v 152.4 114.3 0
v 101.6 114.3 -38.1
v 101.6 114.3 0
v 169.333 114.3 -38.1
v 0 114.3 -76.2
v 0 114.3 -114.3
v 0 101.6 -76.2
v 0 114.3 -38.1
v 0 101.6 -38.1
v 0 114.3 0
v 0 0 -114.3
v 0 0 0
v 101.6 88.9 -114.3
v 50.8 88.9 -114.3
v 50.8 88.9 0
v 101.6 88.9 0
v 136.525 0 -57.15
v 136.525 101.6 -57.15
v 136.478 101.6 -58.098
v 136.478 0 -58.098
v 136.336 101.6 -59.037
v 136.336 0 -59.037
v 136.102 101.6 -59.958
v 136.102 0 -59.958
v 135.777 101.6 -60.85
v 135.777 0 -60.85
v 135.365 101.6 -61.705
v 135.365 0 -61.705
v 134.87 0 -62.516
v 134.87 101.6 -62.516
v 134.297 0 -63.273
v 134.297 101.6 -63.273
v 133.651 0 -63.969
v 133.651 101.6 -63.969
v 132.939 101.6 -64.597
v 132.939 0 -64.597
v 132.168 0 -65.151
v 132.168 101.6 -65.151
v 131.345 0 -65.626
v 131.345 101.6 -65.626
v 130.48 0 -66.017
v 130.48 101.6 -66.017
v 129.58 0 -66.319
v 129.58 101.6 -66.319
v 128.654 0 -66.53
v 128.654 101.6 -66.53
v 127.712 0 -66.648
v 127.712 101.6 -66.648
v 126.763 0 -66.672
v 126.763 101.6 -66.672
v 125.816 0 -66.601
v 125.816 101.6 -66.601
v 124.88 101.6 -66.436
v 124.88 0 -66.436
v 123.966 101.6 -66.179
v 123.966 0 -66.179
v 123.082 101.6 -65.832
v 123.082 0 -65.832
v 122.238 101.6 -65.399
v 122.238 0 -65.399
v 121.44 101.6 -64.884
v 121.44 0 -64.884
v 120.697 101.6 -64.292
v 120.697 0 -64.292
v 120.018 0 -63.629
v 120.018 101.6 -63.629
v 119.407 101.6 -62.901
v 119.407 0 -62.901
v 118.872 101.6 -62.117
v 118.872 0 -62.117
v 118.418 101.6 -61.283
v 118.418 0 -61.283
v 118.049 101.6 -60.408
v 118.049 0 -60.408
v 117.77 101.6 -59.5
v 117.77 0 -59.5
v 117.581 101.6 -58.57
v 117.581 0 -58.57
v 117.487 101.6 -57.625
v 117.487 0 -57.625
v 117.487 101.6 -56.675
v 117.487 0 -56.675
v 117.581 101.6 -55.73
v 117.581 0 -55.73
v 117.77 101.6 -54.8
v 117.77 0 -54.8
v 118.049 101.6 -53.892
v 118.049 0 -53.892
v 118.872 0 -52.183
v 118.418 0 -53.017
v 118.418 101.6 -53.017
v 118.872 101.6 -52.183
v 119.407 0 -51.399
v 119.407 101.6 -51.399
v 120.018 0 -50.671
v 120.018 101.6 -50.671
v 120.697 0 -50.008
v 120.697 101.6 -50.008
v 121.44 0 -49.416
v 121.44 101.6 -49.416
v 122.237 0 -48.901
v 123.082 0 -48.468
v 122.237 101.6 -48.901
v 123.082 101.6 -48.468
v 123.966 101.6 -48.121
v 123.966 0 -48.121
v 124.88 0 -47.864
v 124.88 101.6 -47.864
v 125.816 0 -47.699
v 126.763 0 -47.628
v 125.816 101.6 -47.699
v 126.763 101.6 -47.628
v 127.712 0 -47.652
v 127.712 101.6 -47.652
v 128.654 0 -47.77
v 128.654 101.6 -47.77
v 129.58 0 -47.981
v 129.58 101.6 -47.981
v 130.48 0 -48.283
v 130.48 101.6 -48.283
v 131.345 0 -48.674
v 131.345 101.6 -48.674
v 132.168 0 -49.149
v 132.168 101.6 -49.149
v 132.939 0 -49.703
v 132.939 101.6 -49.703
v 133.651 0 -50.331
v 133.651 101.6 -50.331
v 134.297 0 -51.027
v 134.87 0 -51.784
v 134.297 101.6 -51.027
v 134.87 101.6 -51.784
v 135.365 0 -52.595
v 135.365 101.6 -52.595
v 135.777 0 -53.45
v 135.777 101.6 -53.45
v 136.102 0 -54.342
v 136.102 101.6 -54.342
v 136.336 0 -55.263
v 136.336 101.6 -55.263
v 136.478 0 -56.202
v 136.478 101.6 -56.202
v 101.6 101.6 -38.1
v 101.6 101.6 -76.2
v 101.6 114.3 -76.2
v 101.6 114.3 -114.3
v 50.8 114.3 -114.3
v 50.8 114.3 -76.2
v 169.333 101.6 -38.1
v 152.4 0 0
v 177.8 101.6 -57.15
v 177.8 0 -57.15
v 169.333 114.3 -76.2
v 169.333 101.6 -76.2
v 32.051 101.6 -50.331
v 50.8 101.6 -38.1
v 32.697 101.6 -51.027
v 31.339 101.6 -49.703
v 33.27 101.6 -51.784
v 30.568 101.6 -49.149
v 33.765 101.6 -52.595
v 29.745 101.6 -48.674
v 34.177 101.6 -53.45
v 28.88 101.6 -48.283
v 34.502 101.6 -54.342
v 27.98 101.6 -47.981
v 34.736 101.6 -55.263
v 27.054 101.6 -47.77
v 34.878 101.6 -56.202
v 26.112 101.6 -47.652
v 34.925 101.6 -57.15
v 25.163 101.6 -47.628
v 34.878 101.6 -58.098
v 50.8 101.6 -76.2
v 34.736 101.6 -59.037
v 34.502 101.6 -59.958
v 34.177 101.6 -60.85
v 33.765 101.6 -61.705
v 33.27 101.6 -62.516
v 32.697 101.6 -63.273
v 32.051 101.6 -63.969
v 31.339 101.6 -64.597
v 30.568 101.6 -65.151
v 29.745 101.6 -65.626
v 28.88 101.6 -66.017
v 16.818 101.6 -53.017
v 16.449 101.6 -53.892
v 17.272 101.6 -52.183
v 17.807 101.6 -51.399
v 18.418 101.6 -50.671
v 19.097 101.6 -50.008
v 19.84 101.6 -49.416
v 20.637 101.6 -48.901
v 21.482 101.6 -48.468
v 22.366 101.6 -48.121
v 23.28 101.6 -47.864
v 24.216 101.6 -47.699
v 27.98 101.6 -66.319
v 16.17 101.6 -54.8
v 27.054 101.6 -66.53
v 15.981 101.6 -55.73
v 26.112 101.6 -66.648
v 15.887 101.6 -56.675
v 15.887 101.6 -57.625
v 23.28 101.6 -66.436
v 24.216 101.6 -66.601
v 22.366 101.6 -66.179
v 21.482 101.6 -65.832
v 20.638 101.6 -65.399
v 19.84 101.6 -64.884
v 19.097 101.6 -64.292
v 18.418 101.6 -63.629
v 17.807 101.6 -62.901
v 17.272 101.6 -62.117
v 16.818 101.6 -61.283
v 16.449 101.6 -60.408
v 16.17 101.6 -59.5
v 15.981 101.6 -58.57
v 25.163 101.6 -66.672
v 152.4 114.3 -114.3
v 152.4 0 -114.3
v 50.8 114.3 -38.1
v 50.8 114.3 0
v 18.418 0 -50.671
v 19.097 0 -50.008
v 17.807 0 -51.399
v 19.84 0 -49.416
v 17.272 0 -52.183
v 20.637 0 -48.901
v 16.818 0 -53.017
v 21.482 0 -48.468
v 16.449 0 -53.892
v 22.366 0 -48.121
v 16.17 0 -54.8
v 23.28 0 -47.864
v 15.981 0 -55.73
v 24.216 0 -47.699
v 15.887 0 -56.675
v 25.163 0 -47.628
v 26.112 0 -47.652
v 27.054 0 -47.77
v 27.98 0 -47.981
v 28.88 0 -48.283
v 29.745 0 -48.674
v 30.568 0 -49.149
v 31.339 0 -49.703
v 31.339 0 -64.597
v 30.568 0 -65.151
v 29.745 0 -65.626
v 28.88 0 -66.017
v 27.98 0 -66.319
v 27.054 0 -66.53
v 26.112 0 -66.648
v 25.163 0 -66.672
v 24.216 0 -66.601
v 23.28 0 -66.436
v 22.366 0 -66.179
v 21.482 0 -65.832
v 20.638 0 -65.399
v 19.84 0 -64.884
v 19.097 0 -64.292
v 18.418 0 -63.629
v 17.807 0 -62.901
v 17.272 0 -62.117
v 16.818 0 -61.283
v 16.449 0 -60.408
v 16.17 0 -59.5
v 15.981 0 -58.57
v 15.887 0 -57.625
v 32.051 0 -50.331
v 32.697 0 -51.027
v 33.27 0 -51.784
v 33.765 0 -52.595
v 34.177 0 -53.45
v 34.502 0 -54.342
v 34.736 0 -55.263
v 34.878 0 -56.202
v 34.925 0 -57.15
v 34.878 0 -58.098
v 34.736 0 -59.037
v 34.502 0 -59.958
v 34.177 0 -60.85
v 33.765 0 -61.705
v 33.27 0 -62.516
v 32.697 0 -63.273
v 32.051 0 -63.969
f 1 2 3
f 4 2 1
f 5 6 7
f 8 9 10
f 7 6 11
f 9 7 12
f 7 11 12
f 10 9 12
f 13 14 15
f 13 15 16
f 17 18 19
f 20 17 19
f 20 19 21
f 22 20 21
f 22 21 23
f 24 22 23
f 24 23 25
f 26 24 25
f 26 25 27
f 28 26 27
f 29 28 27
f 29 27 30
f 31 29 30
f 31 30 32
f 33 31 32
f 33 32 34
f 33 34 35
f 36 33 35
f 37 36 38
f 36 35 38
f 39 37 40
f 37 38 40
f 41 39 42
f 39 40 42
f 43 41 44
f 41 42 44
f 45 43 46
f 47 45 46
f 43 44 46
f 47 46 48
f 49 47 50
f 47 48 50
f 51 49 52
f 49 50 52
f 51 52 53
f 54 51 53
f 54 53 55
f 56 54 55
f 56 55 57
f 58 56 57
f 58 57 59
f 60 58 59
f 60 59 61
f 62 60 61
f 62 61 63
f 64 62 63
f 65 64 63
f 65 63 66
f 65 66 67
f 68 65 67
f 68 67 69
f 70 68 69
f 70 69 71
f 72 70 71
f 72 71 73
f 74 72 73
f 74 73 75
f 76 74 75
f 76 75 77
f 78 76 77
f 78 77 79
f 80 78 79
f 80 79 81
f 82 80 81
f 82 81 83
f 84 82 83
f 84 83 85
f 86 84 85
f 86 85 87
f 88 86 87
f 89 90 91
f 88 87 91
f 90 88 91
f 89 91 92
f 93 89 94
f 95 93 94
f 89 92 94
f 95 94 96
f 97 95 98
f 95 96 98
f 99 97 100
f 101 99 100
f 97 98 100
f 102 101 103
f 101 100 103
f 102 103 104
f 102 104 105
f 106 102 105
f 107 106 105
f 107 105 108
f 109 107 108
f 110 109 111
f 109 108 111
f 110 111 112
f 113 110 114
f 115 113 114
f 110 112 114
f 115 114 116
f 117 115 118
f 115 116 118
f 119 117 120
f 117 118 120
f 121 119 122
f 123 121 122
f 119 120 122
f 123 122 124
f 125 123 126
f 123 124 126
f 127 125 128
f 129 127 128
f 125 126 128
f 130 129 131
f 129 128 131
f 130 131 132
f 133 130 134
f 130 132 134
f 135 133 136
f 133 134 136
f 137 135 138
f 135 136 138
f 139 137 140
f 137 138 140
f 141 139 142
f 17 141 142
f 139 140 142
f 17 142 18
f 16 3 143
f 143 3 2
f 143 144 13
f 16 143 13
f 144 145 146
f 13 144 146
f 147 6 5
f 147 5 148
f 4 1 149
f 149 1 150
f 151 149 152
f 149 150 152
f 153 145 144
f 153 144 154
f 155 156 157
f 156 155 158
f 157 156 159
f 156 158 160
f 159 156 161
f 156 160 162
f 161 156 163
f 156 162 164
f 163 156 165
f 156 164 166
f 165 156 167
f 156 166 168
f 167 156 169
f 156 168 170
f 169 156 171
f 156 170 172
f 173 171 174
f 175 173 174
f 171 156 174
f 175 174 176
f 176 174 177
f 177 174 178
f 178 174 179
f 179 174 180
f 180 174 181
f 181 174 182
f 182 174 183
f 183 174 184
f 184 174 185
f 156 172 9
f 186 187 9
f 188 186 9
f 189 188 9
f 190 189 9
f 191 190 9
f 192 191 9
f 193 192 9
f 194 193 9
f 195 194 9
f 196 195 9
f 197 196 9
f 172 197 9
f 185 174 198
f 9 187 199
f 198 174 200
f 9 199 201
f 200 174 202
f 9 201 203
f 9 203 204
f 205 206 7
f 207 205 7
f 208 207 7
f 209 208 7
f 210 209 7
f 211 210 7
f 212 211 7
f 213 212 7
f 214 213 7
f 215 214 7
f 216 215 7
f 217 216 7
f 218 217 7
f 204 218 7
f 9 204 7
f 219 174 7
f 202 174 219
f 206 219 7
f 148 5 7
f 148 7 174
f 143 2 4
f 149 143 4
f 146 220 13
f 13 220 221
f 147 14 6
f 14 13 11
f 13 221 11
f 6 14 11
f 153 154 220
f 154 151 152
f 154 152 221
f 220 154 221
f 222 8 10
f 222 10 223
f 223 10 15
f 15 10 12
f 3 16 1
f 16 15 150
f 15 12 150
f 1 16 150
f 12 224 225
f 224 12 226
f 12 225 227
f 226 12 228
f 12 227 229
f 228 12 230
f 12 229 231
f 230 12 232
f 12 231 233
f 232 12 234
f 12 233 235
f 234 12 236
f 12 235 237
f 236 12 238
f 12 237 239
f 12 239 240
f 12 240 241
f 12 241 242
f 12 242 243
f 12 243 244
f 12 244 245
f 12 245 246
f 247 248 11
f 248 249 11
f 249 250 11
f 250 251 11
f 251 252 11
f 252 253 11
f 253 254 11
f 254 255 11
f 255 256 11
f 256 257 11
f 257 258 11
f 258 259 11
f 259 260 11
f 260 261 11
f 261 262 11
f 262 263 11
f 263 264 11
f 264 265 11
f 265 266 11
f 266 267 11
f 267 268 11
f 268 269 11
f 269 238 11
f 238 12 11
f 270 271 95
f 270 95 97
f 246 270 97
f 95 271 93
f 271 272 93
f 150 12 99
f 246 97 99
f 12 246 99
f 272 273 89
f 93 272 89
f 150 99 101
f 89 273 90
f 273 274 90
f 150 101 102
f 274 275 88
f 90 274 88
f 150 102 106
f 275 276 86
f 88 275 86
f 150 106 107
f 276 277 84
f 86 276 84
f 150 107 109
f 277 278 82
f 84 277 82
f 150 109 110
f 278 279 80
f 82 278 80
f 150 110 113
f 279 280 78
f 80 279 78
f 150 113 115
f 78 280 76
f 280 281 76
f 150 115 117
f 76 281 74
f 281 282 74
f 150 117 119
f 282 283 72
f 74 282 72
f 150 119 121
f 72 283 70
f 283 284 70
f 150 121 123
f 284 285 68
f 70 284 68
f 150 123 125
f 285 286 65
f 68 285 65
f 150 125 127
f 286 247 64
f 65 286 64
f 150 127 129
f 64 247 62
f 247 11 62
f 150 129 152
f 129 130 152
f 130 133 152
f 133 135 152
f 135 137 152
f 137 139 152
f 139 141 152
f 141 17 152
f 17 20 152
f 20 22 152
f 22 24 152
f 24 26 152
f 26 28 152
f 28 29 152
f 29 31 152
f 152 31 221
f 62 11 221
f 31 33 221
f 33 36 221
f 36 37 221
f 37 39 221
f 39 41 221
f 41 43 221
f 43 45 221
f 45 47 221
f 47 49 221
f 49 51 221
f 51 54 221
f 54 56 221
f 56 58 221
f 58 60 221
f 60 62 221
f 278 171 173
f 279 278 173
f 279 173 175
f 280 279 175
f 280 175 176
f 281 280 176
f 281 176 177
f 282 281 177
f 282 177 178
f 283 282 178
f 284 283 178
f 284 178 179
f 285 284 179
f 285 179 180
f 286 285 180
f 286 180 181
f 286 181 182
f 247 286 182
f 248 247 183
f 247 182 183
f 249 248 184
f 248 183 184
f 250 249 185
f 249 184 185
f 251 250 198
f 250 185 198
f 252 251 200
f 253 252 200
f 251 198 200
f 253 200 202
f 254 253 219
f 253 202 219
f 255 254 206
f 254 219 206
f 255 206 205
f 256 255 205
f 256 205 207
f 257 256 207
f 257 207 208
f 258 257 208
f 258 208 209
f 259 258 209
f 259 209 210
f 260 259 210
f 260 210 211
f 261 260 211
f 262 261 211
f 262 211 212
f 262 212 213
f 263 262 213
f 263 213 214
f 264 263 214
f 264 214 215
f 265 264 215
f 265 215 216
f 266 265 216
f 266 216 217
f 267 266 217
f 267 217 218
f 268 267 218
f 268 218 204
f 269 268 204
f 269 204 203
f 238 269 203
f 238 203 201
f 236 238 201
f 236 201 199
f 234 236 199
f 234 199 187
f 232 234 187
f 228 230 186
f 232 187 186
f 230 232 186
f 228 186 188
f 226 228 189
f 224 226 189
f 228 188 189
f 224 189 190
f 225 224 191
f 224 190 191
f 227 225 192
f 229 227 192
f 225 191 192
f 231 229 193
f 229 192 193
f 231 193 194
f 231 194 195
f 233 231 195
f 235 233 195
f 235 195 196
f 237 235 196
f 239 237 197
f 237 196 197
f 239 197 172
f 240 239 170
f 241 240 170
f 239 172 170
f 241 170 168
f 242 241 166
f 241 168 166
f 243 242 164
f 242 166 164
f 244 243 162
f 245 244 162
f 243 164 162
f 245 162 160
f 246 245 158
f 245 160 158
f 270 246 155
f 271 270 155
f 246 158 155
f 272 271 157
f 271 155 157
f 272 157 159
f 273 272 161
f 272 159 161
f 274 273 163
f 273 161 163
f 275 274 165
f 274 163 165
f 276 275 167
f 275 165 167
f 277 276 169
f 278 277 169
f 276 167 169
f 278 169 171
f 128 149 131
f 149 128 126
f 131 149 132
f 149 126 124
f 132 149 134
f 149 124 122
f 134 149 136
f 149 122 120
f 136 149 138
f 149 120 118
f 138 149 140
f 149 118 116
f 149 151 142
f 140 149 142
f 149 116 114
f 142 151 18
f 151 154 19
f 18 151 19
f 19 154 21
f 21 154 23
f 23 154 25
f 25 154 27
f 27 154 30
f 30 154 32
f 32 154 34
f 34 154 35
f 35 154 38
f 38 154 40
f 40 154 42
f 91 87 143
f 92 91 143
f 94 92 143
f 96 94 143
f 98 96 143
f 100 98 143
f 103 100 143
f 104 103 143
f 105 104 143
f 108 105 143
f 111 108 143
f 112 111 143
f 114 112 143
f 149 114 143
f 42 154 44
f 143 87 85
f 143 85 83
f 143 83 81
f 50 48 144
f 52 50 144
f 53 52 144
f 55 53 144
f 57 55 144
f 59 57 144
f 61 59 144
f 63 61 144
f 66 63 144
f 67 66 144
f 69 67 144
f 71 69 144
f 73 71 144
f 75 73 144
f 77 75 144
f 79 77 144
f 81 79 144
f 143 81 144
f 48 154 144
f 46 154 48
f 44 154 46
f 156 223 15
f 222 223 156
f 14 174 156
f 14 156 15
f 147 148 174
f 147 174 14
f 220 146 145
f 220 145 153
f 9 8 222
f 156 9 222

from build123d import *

# Parameters (mm, degrees)
BOSS_EXTRUDE1_DEPTH = 114.3
CUT_EXTRUDE4_DEPTH  = 12.7
SKETCH5_W           = 50.8
SKETCH5_H           = 114.3
CUT_EXTRUDE5_DEPTH  = 25.4
SKETCH6_R           = 9.525
CUT_EXTRUDE6_DEPTH  = 2286
SKETCH7_R           = 9.525
CUT_EXTRUDE7_DEPTH  = 2286


with BuildPart() as part:
    # Sketch2 → Boss-Extrude1 (new body)
    with BuildSketch(Plane(origin=(0, 0, 0), x_dir=(1, 0, 0), z_dir=(0, 1, 0))):
        Polygon((0, 0), (152.4, 0), (177.8, 57.15), (152.4, 114.3), (0, 114.3), align=None)
    extrude(amount=BOSS_EXTRUDE1_DEPTH)

    # Sketch3 → Cut-Extrude4 (cut)
    with BuildSketch(Plane(origin=(0, 114.3, 0), x_dir=(1, 0, 0), z_dir=(0, 1, 0))):
        Polygon((169.333333333, 38.1), (0, 38.1), (0, 76.2), (267.804009423, 76.2), (218.011692499, 38.1), align=None)
    extrude(amount=-CUT_EXTRUDE4_DEPTH, mode=Mode.SUBTRACT)

    # Sketch5 → Cut-Extrude5 (cut)
    with BuildSketch(Plane(origin=(0, 114.3, 0), x_dir=(1, 0, 0), z_dir=(0, 1, 0))):
        with Locations((76.2, 57.15)):
            Rectangle(SKETCH5_W, SKETCH5_H)
    extrude(amount=-CUT_EXTRUDE5_DEPTH, mode=Mode.SUBTRACT)

    # Sketch6 → Cut-Extrude6 (cut)
    with BuildSketch(Plane(origin=(0, 101.6, 0), x_dir=(1, 0, 0), z_dir=(0, 1, 0))):
        with Locations((127, 57.15)):
            Circle(SKETCH6_R)
    extrude(amount=-CUT_EXTRUDE6_DEPTH, mode=Mode.SUBTRACT)

    # Sketch7 → Cut-Extrude7 (cut)
    with BuildSketch(Plane(origin=(0, 101.6, 0), x_dir=(1, 0, 0), z_dir=(0, 1, 0))):
        with Locations((25.4, 57.15)):
            Circle(SKETCH7_R)
    extrude(amount=-CUT_EXTRUDE7_DEPTH, mode=Mode.SUBTRACT)


solid = part.part
